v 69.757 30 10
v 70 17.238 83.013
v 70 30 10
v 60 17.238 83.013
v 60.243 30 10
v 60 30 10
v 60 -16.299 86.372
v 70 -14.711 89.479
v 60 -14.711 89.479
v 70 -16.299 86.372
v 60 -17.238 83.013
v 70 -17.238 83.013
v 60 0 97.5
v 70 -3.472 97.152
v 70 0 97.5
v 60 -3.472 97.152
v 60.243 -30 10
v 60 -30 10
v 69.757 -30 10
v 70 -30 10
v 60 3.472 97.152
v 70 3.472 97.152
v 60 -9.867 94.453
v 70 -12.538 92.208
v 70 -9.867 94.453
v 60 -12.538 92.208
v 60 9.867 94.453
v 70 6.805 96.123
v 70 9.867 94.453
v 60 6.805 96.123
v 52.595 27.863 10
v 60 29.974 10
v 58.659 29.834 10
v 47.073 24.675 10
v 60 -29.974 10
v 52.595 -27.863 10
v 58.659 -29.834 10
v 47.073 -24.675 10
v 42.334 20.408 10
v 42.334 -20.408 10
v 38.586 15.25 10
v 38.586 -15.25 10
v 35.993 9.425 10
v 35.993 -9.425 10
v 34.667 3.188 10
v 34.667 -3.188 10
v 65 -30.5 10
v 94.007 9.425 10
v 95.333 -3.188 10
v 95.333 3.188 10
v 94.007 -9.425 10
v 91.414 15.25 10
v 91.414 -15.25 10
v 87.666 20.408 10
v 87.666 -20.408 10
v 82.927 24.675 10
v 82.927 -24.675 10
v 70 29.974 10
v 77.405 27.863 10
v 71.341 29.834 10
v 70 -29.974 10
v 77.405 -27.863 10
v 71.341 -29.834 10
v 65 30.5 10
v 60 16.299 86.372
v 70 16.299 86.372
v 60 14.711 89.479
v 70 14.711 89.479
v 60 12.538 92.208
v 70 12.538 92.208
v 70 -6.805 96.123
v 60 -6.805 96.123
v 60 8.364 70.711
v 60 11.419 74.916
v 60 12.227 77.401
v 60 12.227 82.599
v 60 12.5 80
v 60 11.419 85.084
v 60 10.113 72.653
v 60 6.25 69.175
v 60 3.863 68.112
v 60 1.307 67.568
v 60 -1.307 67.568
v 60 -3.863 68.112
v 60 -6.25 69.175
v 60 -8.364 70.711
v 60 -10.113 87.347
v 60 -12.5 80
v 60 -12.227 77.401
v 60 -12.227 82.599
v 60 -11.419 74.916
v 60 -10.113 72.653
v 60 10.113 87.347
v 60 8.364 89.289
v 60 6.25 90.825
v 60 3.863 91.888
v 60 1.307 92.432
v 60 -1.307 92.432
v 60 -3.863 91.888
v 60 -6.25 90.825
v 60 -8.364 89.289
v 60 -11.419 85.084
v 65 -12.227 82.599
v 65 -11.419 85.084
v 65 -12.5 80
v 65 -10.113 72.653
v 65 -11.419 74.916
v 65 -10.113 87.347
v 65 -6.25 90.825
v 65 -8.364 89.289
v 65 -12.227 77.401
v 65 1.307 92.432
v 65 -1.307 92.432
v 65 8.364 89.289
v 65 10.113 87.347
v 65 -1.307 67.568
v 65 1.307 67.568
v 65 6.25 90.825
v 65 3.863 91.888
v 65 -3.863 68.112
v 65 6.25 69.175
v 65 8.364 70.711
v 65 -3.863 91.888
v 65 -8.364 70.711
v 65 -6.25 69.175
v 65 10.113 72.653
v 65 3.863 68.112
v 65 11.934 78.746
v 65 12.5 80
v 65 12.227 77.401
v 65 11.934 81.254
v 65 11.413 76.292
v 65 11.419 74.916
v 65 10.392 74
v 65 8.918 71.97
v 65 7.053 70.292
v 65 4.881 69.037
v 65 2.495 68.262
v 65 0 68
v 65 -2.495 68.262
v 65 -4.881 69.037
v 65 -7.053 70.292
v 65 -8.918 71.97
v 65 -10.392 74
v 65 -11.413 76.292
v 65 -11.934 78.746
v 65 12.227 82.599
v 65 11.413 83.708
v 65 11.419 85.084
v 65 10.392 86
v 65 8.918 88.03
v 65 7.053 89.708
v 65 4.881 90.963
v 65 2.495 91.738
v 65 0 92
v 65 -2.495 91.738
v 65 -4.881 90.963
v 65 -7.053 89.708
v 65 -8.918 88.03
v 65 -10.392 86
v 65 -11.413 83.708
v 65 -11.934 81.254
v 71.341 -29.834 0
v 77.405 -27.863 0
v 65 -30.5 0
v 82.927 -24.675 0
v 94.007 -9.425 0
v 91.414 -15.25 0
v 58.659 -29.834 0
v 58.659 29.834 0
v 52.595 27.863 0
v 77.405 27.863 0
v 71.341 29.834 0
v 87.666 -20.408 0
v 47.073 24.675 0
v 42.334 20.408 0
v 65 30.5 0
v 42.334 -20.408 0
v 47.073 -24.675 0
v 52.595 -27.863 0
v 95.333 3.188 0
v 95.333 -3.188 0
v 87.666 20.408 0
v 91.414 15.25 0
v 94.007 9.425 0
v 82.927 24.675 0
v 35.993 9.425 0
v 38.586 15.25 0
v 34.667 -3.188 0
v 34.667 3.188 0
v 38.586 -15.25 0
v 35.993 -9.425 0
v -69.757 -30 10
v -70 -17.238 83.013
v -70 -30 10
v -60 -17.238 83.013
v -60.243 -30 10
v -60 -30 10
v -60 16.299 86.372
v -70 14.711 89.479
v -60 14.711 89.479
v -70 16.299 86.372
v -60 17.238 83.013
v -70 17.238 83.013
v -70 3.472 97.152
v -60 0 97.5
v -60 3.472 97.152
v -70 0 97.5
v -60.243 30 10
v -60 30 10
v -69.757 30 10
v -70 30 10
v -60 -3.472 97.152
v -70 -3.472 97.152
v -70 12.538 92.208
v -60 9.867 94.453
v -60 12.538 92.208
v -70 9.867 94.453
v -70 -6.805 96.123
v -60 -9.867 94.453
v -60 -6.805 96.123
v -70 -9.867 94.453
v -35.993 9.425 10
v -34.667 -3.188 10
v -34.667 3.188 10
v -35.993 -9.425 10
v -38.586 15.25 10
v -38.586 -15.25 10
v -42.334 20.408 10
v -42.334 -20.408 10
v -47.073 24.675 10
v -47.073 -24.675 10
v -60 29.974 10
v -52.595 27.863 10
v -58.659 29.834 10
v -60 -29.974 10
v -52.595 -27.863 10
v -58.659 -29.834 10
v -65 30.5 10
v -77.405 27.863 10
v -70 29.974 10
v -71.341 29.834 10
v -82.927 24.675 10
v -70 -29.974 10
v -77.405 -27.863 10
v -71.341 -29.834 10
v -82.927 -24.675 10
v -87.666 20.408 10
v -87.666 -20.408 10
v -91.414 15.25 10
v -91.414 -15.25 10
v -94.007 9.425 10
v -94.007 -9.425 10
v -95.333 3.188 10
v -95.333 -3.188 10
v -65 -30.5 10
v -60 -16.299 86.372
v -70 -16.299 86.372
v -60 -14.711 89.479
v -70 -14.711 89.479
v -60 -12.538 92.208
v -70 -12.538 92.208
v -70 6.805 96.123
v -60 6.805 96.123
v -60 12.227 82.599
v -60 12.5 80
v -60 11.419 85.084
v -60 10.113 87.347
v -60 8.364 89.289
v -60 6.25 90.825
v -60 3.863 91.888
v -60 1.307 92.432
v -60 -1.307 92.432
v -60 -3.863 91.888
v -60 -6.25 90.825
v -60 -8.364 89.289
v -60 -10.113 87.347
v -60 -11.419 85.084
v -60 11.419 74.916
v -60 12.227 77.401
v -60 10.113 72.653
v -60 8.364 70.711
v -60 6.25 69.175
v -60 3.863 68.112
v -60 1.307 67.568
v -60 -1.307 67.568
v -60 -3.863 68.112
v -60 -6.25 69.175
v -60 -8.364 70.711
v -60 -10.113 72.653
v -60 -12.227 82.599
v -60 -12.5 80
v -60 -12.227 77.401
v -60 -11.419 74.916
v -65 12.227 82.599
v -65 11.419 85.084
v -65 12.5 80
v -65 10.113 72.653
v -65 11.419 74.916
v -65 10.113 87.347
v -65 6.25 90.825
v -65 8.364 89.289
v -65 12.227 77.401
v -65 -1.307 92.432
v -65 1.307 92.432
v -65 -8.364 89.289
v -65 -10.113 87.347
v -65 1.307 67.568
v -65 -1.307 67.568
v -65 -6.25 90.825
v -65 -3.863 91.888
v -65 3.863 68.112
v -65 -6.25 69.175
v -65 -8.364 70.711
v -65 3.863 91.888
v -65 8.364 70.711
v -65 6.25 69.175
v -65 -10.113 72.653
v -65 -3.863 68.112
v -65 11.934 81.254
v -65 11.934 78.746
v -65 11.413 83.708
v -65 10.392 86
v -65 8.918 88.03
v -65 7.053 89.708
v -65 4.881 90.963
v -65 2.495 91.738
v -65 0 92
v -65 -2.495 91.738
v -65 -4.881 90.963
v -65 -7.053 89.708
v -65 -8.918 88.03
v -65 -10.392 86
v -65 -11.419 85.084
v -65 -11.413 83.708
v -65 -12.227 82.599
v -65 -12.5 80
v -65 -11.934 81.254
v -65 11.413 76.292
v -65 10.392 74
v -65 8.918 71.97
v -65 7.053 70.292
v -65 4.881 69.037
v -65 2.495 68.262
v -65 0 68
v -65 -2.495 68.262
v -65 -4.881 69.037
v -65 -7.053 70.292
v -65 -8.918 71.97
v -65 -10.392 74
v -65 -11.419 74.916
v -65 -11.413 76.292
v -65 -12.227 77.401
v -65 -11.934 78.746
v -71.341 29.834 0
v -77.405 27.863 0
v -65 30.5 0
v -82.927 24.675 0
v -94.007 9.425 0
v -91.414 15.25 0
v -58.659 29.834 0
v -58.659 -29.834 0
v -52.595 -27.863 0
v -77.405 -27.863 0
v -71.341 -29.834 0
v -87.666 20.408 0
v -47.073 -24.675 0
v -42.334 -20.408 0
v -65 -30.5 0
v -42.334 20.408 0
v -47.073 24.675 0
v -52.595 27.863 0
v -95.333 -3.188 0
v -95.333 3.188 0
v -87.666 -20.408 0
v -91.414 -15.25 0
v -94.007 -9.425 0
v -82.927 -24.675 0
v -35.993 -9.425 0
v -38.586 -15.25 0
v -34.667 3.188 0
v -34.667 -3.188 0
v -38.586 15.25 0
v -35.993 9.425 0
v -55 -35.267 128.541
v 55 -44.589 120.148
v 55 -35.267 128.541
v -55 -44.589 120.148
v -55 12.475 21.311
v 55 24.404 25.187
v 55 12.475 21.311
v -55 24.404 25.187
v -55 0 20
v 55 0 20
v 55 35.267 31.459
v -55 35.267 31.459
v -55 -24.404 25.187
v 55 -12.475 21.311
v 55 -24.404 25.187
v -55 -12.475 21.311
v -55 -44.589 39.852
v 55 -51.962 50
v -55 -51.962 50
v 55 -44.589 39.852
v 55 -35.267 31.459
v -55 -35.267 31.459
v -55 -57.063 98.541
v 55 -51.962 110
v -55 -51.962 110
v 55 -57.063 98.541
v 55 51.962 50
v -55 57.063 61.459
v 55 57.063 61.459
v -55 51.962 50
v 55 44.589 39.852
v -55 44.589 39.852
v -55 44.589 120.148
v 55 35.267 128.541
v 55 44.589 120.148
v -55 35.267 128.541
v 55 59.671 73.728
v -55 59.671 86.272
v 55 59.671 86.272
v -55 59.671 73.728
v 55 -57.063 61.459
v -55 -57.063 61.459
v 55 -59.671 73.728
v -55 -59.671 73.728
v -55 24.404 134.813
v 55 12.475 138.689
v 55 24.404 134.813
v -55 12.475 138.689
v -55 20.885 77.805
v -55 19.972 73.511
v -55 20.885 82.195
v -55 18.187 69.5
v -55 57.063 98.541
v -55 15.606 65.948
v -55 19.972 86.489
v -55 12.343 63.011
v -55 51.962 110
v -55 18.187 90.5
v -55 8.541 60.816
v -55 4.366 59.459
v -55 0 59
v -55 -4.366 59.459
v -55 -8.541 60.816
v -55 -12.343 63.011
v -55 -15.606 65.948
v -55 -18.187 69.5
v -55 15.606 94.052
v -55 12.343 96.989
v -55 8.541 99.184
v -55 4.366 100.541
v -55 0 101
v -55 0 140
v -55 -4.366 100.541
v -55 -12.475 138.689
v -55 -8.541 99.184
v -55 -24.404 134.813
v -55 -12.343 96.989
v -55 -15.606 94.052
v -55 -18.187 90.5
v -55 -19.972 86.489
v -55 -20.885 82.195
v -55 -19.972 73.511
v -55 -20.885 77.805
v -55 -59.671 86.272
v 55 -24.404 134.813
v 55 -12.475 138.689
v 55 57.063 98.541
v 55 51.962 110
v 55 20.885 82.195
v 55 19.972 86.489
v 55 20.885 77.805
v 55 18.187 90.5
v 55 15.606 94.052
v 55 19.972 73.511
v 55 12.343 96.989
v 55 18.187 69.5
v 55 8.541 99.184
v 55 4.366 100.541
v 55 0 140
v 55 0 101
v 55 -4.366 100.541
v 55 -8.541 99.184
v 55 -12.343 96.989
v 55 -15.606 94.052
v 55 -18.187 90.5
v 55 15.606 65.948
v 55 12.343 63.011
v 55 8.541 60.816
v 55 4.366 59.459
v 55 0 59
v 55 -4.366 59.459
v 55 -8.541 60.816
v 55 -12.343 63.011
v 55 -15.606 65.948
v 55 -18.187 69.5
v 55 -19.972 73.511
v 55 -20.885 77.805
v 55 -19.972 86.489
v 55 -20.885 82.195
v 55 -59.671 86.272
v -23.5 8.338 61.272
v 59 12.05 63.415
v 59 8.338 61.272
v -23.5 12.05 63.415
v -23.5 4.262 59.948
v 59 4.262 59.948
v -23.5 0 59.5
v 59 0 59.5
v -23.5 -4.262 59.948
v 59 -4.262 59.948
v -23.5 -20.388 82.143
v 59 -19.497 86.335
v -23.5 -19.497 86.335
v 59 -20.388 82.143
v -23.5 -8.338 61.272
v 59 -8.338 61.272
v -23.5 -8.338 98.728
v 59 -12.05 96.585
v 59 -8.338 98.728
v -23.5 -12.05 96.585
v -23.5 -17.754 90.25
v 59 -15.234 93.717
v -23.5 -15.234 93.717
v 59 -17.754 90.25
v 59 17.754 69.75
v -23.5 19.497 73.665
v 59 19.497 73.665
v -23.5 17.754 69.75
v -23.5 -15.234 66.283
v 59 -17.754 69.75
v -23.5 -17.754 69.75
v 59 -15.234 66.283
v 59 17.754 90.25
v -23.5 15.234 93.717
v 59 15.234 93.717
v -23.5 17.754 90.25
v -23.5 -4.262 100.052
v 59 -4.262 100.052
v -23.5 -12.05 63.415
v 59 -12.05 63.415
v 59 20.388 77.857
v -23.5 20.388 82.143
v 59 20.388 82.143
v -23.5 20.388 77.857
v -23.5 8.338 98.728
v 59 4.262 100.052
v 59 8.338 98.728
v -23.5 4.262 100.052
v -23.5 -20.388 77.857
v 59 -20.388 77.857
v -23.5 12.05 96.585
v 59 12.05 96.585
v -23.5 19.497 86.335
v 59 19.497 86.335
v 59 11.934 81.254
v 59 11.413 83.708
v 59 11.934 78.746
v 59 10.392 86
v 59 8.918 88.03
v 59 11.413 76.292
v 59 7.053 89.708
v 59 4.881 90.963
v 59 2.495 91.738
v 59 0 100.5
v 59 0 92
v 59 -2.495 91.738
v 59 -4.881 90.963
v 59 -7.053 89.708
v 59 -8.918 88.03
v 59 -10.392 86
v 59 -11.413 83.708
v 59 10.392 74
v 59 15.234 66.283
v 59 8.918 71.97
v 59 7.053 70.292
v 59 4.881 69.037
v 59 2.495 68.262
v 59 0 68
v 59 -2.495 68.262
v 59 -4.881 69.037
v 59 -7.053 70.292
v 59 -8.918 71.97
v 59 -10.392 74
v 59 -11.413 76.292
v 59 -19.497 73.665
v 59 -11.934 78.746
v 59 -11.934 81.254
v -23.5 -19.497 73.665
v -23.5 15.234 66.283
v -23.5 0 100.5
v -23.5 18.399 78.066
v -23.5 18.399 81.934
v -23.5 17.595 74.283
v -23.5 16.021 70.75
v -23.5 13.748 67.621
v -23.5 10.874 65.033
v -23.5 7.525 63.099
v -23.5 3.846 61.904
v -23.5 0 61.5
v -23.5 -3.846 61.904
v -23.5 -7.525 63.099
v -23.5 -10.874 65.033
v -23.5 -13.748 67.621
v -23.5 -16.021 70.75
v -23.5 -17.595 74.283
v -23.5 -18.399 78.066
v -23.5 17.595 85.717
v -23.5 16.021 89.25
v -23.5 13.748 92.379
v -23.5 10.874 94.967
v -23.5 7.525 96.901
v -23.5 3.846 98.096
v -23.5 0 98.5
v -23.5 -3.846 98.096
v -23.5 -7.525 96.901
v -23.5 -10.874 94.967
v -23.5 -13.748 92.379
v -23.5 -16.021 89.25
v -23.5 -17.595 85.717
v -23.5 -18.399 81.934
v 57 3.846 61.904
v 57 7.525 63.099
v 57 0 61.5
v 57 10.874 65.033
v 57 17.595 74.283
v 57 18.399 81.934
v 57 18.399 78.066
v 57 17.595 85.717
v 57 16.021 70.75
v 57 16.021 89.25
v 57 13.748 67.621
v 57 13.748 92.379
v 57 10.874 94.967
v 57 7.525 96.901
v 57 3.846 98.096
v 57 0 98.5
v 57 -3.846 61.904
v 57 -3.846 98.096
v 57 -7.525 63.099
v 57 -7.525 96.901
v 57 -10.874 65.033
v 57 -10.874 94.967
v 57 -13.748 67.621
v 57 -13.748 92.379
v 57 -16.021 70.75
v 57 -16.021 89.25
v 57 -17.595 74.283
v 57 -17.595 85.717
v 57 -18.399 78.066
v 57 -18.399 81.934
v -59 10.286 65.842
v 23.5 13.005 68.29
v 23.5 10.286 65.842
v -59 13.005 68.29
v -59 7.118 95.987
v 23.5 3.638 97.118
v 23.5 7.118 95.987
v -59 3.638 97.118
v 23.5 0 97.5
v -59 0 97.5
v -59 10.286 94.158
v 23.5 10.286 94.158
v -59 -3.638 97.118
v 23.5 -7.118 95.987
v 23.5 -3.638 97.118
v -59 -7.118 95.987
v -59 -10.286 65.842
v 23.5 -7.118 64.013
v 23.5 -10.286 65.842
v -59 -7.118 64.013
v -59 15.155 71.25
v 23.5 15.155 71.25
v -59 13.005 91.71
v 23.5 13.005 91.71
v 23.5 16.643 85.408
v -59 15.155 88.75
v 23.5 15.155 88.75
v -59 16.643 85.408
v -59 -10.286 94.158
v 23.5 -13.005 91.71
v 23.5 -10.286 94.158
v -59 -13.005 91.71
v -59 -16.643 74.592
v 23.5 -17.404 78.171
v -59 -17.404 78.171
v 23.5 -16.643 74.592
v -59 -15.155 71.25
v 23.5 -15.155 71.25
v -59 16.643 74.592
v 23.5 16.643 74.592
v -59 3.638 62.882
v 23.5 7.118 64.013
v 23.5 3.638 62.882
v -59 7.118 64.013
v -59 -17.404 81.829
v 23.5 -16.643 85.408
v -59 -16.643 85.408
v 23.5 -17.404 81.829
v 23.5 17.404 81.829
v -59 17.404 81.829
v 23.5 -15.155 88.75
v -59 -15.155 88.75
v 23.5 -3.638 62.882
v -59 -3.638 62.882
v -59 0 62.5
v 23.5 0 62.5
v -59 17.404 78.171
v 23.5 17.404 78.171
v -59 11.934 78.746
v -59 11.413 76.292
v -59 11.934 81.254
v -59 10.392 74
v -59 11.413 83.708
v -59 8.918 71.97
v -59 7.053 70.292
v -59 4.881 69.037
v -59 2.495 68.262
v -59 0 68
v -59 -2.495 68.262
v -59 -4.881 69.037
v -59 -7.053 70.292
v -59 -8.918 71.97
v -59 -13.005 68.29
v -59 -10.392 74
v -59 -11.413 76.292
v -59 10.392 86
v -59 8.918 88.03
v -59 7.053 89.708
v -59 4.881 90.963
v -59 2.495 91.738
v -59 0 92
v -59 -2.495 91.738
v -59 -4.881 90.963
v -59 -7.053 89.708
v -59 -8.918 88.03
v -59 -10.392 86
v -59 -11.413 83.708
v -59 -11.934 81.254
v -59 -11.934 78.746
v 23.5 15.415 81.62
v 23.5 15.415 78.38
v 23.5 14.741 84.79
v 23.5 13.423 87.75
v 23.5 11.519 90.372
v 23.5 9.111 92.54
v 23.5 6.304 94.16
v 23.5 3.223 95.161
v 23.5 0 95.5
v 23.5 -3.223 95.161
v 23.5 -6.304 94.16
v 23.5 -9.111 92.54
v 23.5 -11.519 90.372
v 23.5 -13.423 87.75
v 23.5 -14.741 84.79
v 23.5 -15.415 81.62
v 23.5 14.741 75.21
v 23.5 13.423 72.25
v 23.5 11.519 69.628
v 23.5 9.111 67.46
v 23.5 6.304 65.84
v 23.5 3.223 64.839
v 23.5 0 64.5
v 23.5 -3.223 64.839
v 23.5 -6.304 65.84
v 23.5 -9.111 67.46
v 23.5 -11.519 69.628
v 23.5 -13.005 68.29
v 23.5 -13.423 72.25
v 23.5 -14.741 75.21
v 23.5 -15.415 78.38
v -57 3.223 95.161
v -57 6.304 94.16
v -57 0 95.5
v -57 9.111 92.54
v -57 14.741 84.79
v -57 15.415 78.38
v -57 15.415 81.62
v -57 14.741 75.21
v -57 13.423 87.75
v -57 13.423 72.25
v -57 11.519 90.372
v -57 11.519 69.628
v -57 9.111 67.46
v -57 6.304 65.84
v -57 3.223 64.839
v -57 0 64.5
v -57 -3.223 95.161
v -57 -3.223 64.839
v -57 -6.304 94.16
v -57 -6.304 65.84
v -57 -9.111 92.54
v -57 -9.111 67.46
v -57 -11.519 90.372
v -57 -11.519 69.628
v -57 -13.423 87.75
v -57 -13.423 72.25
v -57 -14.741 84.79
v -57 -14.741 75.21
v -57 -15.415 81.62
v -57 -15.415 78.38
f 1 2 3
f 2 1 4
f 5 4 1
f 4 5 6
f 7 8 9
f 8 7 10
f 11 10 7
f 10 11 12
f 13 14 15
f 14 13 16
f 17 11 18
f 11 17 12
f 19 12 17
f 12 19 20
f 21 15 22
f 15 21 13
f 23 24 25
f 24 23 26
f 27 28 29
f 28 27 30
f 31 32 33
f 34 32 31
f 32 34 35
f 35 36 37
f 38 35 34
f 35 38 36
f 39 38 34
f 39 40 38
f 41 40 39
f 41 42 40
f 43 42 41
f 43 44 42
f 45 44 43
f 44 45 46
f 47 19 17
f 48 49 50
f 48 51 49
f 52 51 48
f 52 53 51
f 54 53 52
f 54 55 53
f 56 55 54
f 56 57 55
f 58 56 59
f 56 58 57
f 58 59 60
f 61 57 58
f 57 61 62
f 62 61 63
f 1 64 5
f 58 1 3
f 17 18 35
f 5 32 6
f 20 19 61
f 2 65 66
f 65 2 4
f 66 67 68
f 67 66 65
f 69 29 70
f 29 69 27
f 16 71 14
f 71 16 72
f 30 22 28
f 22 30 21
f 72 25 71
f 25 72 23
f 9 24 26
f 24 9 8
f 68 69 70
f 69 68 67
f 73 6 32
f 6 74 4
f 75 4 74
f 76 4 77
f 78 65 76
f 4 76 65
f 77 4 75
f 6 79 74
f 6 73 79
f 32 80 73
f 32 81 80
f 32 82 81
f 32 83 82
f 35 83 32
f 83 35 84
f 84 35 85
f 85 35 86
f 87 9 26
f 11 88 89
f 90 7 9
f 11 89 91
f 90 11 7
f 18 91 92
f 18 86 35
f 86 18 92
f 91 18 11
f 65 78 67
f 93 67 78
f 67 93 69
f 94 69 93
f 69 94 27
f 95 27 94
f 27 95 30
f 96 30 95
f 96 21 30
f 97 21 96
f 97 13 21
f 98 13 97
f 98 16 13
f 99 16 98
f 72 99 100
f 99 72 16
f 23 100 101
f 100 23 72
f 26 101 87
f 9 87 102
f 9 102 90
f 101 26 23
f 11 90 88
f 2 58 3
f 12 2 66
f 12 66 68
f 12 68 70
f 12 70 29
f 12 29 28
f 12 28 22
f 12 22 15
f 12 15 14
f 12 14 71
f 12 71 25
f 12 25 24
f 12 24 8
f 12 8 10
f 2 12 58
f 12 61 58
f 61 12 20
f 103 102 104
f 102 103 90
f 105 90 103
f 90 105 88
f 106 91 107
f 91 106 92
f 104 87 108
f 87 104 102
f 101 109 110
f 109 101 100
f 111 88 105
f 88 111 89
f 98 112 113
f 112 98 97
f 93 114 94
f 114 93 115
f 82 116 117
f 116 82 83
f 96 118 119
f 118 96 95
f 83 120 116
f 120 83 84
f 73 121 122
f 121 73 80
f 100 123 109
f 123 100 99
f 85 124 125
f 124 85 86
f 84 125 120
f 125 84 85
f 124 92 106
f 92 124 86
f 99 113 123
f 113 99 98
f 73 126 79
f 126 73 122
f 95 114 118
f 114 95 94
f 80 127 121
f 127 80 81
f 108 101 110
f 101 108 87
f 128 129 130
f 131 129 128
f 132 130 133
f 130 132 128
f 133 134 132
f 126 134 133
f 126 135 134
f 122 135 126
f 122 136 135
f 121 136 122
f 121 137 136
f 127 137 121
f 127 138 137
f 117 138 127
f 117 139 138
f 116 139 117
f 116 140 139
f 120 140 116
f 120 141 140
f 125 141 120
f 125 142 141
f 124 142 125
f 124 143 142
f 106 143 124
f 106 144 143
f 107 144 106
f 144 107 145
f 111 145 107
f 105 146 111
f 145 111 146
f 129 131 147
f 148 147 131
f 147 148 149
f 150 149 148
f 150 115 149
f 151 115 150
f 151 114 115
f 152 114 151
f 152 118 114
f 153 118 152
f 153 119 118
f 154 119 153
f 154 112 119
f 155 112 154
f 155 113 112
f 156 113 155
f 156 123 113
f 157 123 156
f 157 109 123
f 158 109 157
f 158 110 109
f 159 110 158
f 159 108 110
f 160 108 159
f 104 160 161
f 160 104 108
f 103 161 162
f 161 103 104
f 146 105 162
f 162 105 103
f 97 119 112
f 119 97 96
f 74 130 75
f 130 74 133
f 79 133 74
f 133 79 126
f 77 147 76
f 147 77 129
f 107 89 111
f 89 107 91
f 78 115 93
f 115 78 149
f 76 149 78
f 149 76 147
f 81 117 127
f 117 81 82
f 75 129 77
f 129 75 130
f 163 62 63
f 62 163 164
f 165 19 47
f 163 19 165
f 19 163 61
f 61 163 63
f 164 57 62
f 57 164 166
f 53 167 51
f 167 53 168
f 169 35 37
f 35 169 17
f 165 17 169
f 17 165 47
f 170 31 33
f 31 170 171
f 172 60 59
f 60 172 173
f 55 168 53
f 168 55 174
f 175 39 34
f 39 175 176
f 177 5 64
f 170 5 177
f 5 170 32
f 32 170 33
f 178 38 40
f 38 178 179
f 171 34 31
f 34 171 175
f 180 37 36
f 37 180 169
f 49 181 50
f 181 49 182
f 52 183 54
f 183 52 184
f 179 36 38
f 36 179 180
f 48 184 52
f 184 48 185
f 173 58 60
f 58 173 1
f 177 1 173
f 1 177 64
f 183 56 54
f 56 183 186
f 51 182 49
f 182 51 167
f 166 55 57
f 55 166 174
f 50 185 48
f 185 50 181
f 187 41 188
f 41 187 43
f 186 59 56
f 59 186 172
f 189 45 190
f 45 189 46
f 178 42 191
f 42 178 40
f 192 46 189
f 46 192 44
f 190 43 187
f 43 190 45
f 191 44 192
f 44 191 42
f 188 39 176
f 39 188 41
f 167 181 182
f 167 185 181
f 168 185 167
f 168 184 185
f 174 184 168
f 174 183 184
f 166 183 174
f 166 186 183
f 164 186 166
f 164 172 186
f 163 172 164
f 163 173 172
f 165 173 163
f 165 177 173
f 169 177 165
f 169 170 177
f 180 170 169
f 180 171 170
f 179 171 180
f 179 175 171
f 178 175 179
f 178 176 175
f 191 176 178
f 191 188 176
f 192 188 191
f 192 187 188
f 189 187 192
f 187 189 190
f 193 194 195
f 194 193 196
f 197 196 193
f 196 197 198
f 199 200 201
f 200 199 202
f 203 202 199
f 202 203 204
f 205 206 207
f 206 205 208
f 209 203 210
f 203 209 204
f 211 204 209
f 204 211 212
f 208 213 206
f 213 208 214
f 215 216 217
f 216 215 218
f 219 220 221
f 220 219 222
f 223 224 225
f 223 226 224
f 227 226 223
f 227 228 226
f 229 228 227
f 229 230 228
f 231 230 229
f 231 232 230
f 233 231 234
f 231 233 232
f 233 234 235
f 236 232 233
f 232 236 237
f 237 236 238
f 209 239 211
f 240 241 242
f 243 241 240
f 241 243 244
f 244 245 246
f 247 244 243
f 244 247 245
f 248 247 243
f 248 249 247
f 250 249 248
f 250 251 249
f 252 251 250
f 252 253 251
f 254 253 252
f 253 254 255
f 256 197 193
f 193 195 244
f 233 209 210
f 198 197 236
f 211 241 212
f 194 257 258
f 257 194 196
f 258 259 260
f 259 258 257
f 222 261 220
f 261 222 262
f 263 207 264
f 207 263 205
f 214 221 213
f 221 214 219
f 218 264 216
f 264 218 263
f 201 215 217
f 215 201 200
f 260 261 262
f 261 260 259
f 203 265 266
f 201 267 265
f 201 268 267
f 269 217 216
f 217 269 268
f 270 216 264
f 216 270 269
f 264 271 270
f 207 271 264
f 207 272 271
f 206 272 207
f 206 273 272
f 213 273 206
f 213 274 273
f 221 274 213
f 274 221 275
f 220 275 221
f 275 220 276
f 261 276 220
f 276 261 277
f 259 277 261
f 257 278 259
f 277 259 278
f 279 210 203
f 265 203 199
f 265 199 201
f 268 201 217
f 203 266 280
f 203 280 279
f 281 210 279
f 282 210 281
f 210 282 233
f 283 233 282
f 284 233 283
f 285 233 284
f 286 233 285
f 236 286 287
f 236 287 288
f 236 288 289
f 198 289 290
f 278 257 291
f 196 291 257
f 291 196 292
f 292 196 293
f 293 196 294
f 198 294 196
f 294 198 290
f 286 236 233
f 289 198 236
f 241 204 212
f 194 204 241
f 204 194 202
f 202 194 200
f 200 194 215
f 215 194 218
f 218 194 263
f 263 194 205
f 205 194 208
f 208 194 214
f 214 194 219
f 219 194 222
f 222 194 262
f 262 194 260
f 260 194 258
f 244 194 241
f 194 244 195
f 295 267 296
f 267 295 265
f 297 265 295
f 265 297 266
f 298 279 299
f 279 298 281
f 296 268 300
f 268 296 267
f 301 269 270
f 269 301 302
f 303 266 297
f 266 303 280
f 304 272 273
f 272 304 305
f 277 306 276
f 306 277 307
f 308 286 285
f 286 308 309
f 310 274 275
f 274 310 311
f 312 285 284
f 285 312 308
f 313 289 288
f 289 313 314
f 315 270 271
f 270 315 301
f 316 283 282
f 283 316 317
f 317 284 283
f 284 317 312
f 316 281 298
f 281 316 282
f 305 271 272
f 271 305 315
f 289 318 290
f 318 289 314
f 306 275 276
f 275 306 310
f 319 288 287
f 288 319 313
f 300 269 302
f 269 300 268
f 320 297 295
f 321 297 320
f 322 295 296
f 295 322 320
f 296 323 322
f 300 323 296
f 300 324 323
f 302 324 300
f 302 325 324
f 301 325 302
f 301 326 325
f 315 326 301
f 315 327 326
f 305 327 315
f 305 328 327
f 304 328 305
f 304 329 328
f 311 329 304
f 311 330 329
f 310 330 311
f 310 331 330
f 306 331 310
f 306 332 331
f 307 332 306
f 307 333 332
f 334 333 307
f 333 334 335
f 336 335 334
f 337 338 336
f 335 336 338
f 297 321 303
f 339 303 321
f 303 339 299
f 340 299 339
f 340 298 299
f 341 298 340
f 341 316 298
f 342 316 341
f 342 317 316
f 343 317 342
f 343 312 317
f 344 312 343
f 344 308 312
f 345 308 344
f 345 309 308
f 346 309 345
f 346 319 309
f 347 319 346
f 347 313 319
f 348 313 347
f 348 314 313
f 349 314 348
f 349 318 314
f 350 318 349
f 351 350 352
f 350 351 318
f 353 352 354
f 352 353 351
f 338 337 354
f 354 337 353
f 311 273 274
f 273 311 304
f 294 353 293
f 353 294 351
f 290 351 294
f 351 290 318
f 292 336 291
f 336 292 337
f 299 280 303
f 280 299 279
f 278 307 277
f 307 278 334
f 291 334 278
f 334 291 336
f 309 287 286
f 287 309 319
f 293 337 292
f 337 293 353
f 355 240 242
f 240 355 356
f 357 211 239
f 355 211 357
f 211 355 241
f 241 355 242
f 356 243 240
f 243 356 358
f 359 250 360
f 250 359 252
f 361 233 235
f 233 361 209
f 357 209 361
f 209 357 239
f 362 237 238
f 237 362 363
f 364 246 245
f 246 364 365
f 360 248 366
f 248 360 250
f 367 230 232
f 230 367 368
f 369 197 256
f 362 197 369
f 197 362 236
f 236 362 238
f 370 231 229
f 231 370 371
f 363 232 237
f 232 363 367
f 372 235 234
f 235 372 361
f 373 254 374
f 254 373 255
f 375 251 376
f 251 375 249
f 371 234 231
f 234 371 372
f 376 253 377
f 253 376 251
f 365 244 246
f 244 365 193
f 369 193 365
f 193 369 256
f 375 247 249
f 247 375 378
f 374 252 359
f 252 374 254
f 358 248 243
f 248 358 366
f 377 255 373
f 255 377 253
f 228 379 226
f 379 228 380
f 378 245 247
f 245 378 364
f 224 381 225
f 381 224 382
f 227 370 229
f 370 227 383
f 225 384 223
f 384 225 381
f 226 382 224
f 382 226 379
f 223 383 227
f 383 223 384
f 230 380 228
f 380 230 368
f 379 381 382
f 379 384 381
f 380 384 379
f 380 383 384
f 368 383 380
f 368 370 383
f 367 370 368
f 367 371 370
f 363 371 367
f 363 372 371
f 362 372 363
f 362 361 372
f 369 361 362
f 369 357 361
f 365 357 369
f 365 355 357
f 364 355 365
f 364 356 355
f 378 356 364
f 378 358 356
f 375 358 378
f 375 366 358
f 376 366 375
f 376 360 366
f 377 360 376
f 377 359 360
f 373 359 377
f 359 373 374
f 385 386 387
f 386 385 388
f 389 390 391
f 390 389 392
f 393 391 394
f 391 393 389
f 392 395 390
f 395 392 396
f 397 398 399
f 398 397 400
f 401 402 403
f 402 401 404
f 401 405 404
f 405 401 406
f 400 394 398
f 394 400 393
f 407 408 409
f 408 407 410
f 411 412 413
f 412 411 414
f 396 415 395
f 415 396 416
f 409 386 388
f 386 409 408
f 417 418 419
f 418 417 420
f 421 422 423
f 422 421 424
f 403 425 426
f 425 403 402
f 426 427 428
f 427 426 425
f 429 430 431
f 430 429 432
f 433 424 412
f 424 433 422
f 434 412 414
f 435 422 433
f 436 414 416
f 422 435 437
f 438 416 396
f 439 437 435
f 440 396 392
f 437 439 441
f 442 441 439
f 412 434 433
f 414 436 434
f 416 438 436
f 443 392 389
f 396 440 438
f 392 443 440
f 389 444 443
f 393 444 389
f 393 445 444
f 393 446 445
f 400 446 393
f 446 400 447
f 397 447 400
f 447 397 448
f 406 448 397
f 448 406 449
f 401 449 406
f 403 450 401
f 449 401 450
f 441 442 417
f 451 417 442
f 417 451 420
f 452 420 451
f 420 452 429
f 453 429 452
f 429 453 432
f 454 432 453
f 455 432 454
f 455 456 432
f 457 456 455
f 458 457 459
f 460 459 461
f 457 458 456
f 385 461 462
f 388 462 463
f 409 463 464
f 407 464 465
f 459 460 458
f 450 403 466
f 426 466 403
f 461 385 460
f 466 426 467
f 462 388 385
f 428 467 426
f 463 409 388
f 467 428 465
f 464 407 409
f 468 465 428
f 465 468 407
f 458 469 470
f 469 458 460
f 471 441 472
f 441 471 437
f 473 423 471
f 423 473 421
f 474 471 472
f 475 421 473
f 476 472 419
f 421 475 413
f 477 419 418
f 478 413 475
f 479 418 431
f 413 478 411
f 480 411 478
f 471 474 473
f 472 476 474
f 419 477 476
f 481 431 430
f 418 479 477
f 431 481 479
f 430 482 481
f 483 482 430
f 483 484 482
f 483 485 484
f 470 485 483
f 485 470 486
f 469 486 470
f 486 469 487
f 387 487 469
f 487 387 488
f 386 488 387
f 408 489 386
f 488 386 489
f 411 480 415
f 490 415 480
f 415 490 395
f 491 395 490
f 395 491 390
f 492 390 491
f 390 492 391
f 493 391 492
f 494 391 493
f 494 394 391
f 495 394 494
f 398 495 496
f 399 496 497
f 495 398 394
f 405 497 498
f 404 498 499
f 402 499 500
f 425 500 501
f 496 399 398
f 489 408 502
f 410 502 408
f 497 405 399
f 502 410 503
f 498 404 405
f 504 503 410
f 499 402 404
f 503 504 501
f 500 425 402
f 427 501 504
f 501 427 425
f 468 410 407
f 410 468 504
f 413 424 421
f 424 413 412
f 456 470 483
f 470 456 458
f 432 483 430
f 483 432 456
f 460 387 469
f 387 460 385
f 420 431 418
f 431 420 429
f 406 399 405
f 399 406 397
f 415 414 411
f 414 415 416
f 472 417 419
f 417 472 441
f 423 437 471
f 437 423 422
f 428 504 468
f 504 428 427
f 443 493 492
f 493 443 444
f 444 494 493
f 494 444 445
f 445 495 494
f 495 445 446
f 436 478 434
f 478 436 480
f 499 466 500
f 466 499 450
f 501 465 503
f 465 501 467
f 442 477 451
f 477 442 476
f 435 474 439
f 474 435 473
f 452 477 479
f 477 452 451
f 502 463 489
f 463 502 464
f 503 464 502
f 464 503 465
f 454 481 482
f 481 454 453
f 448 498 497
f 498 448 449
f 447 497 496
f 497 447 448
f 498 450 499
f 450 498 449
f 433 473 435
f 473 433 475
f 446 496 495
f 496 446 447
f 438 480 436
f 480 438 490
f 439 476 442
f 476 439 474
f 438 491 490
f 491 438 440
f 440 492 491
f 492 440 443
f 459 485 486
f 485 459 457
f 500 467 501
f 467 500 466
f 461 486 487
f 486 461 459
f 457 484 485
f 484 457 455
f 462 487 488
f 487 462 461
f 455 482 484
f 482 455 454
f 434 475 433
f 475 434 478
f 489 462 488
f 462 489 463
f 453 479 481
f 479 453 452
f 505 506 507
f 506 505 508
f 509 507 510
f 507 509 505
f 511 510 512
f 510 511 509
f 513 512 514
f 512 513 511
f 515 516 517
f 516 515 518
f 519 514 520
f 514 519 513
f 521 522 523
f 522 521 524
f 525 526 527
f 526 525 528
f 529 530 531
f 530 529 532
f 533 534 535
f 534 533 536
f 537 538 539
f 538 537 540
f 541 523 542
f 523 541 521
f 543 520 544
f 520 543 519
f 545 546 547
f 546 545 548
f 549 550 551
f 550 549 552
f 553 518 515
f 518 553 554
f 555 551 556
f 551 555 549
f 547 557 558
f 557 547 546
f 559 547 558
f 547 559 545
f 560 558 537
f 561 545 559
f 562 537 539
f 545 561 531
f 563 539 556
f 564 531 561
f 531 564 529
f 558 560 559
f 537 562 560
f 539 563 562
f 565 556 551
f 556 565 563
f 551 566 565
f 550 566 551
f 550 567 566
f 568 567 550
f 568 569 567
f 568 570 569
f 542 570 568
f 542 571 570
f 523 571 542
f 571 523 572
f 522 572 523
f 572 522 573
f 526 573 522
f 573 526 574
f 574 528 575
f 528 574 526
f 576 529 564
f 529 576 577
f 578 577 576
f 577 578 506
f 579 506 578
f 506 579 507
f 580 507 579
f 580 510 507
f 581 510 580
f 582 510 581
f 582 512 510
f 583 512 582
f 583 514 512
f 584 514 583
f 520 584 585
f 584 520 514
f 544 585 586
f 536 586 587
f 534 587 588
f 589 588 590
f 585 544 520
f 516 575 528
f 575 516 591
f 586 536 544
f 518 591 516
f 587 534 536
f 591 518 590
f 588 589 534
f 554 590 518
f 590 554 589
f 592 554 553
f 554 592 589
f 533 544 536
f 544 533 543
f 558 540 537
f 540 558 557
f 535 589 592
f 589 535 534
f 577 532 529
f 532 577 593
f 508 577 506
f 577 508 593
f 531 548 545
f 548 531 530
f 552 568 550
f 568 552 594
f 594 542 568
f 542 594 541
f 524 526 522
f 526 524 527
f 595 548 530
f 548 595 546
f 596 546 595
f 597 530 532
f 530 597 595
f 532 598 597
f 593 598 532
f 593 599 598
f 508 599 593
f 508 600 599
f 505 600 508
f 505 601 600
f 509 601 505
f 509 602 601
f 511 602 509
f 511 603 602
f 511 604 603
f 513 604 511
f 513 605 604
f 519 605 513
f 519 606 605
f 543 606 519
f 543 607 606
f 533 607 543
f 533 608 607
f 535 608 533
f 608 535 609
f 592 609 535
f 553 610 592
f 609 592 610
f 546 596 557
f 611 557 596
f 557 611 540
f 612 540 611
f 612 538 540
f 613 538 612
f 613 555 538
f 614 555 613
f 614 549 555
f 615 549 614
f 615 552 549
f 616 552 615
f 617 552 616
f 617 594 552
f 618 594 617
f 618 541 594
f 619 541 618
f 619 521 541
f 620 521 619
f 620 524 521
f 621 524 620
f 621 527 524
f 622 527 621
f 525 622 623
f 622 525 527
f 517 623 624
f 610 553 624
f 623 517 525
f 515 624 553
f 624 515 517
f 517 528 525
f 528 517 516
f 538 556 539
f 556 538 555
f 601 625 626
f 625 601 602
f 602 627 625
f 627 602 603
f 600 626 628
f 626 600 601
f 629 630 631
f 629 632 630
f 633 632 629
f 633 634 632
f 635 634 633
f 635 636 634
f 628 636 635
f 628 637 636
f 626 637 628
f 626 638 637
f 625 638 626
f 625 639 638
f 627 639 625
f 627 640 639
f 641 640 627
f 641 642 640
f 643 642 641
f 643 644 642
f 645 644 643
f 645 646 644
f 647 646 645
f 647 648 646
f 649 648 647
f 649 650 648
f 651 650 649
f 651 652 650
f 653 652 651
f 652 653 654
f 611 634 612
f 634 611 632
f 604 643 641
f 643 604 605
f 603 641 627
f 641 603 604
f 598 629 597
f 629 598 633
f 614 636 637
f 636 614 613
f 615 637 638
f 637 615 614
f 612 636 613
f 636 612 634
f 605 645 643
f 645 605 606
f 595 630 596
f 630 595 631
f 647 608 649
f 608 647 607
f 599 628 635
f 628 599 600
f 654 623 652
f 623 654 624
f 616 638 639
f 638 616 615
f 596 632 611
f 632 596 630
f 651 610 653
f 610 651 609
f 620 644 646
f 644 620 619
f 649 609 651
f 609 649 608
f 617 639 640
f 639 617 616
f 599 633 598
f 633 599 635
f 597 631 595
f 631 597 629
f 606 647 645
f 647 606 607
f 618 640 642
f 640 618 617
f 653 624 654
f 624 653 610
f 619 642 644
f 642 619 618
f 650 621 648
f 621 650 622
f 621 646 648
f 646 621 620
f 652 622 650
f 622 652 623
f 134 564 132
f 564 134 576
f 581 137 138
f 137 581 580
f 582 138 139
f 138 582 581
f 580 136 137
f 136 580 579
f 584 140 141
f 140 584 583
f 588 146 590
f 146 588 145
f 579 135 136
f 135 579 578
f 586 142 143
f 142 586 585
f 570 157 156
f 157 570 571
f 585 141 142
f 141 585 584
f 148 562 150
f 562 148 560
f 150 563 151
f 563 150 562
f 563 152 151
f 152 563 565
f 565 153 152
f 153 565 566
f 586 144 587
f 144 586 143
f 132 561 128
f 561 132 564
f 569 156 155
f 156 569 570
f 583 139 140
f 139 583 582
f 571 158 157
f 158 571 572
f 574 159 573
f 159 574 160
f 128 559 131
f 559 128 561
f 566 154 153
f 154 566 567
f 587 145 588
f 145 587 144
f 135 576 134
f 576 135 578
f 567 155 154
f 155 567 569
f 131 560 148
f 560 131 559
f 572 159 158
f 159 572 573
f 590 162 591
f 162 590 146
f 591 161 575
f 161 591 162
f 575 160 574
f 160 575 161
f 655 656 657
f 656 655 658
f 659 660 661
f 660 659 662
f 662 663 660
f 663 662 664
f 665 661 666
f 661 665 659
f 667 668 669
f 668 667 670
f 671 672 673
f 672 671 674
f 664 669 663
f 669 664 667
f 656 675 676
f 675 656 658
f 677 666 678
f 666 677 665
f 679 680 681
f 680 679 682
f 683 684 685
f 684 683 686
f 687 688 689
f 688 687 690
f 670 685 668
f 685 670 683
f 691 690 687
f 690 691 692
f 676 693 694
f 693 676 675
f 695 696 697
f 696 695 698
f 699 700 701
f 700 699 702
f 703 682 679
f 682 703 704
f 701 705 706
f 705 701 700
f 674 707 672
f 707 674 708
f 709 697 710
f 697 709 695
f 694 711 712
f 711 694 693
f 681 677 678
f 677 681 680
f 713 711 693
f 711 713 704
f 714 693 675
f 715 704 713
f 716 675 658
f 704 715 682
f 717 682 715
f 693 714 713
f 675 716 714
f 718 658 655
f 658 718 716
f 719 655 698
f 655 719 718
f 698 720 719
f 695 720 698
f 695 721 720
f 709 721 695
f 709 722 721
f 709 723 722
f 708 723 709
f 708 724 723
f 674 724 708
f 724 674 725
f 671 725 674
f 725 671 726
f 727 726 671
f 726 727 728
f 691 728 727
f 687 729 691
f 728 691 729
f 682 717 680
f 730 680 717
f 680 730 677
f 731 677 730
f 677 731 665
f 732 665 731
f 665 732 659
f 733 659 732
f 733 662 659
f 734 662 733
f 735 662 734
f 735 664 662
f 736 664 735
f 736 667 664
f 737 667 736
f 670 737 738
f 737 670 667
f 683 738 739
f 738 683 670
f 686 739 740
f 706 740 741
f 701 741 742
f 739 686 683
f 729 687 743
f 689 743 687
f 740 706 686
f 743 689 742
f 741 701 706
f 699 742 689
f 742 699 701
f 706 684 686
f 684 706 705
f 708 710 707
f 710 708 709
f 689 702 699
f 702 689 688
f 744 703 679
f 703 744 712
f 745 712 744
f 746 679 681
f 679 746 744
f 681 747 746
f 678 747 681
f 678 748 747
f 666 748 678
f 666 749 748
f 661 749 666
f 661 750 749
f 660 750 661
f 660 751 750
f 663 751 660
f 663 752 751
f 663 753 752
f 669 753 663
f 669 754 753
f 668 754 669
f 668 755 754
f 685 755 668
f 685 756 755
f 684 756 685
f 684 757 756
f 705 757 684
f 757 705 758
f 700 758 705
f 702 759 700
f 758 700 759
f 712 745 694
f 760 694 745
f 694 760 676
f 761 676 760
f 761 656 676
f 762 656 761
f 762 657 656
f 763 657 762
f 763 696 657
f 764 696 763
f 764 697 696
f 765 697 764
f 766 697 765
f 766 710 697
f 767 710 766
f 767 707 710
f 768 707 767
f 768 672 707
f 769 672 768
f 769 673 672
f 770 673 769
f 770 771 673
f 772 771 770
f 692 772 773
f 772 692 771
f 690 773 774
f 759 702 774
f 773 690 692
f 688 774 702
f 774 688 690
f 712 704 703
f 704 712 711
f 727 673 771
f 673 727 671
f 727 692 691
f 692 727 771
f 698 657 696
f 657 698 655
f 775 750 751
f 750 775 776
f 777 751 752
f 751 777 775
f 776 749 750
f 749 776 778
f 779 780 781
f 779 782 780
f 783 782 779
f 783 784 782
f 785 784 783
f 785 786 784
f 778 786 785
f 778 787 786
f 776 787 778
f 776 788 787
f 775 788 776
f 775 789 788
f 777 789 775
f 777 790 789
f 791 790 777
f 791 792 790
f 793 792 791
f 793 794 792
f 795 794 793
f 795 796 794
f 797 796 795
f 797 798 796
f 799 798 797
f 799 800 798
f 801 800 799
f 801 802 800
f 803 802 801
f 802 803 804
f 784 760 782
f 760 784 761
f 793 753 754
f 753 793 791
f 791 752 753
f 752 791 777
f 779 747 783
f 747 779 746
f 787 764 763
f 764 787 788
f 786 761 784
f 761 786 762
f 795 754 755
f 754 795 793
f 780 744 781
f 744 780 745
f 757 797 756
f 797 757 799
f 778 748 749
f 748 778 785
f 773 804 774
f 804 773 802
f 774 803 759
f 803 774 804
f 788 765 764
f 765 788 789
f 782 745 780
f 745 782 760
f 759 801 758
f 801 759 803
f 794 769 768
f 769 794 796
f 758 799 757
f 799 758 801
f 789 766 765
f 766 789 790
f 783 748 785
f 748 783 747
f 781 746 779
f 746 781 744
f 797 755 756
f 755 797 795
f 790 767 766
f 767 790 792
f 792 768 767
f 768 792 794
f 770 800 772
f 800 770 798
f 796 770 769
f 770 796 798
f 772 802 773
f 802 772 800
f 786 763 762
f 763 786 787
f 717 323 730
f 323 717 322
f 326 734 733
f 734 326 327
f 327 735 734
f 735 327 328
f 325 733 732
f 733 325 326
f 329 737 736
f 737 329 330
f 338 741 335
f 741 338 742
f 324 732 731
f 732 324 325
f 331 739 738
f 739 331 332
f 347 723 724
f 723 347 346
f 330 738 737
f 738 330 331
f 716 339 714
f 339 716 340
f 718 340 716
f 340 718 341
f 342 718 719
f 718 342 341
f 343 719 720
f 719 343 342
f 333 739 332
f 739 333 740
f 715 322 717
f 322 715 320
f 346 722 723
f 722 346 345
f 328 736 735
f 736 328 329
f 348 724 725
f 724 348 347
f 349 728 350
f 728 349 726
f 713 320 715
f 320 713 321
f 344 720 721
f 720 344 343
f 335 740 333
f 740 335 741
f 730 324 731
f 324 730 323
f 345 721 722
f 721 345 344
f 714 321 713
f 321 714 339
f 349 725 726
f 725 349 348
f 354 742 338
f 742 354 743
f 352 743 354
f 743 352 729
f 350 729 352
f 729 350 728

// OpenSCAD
tp_assembly();

module tp_assembly()
{
	thickness = 10;
	base_diameter = 61;
	hub_diameter = 25;
	cylinder_wall = 2;
	clearance = 1;

	tp_od = 120;
	tp_id = 42;
	tp_length = 110;

	translate([tp_length/2+10, 0, 0])
		tp_arm(thickness, base_diameter, hub_diameter);
	
	translate([-tp_length/2-10, 0, 0])
		rotate([0, 0, 180])
		tp_arm(thickness, base_diameter, hub_diameter);

	translate([0, 0, 80])
		tp_roll(tp_od, tp_id, tp_length);

	translate([-tp_length*0.25+(thickness/2-clearance), 0, 80])
		rotate([0, 90, 0])
			tp_outer(tp_id, tp_length, hub_diameter, cylinder_wall, clearance, thickness); 

	translate([tp_length*0.25-(thickness/2-clearance), 0, 80])
		rotate([0, -90, 0])
			tp_inner(tp_id, tp_length, hub_diameter, cylinder_wall, clearance, thickness); 

	//tp_arm(thickness, base_diameter, hub_diameter);
	//tp_inner(tp_id, tp_length, hub_diameter, cylinder_wall, clearance, thickness); 
	//tp_outer(tp_id, tp_length, hub_diameter, cylinder_wall, clearance, thickness); 
	//tp_roll(tp_od, tp_id, tp_length);
}

module tp_arm(thickness, base_diameter, hub_diameter)
{
	rotate([0, 0, -90])
	{
		union()
		{
			cylinder(r=base_diameter/2, h=thickness);
		
			difference()
			{
				rotate([90, 0, 0])
					linear_extrude(file="arm.dxf", layer="Arm", height=thickness, center=true);
				translate([0,0, 80])
					rotate([90, 0, 0])
						cylinder(r=hub_diameter/2, thickness/2);	

				translate([hub_diameter*0.6, hub_diameter*0.6, 0])
					cylinder(r=2, h=thickness);
				translate([-hub_diameter*0.6, hub_diameter*0.6, 0])
					cylinder(r=2, h=thickness);
				translate([hub_diameter*0.6, -hub_diameter*0.6, 0])
					cylinder(r=2, h=thickness);
				translate([-hub_diameter*0.6, -hub_diameter*0.6, 0])
					cylinder(r=2, h=thickness);

			}
		}
	}
}

module tp_roll(od, id, length)
{
	rotate([0, 90, 0])
	{
		difference()
		{
			cylinder(r=od/2, h=length, center=true);
			cylinder(r=id/2, h=length, center=true);
		}
	}
}

module tp_inner(tp_id, tp_length, hub_diameter, cylinder_wall, clearance, thickness)
{
	union()
	{
		translate([0, 0, tp_length*0.75])
			cylinder(r=(hub_diameter-clearance)/2, h=thickness);

		difference()
		{
			cylinder(r=(tp_id-clearance*3-cylinder_wall*2)/2, h=tp_length*0.75);
			cylinder(r=(tp_id-clearance*3-cylinder_wall*4)/2, h=(tp_length*0.75-cylinder_wall));
		}
	}
}

module tp_outer(tp_id, tp_length, hub_diameter, cylinder_wall, clearance, thickness)
{
	union()
	{
		translate([0, 0, tp_length*0.75])
			cylinder(r=(hub_diameter-clearance)/2, h=thickness);

		difference()
		{
			cylinder(r=(tp_id-clearance)/2, h=tp_length*0.75);
			cylinder(r=(tp_id-clearance-cylinder_wall*2)/2, h=(tp_length*0.75-cylinder_wall));
		}
	}
}
